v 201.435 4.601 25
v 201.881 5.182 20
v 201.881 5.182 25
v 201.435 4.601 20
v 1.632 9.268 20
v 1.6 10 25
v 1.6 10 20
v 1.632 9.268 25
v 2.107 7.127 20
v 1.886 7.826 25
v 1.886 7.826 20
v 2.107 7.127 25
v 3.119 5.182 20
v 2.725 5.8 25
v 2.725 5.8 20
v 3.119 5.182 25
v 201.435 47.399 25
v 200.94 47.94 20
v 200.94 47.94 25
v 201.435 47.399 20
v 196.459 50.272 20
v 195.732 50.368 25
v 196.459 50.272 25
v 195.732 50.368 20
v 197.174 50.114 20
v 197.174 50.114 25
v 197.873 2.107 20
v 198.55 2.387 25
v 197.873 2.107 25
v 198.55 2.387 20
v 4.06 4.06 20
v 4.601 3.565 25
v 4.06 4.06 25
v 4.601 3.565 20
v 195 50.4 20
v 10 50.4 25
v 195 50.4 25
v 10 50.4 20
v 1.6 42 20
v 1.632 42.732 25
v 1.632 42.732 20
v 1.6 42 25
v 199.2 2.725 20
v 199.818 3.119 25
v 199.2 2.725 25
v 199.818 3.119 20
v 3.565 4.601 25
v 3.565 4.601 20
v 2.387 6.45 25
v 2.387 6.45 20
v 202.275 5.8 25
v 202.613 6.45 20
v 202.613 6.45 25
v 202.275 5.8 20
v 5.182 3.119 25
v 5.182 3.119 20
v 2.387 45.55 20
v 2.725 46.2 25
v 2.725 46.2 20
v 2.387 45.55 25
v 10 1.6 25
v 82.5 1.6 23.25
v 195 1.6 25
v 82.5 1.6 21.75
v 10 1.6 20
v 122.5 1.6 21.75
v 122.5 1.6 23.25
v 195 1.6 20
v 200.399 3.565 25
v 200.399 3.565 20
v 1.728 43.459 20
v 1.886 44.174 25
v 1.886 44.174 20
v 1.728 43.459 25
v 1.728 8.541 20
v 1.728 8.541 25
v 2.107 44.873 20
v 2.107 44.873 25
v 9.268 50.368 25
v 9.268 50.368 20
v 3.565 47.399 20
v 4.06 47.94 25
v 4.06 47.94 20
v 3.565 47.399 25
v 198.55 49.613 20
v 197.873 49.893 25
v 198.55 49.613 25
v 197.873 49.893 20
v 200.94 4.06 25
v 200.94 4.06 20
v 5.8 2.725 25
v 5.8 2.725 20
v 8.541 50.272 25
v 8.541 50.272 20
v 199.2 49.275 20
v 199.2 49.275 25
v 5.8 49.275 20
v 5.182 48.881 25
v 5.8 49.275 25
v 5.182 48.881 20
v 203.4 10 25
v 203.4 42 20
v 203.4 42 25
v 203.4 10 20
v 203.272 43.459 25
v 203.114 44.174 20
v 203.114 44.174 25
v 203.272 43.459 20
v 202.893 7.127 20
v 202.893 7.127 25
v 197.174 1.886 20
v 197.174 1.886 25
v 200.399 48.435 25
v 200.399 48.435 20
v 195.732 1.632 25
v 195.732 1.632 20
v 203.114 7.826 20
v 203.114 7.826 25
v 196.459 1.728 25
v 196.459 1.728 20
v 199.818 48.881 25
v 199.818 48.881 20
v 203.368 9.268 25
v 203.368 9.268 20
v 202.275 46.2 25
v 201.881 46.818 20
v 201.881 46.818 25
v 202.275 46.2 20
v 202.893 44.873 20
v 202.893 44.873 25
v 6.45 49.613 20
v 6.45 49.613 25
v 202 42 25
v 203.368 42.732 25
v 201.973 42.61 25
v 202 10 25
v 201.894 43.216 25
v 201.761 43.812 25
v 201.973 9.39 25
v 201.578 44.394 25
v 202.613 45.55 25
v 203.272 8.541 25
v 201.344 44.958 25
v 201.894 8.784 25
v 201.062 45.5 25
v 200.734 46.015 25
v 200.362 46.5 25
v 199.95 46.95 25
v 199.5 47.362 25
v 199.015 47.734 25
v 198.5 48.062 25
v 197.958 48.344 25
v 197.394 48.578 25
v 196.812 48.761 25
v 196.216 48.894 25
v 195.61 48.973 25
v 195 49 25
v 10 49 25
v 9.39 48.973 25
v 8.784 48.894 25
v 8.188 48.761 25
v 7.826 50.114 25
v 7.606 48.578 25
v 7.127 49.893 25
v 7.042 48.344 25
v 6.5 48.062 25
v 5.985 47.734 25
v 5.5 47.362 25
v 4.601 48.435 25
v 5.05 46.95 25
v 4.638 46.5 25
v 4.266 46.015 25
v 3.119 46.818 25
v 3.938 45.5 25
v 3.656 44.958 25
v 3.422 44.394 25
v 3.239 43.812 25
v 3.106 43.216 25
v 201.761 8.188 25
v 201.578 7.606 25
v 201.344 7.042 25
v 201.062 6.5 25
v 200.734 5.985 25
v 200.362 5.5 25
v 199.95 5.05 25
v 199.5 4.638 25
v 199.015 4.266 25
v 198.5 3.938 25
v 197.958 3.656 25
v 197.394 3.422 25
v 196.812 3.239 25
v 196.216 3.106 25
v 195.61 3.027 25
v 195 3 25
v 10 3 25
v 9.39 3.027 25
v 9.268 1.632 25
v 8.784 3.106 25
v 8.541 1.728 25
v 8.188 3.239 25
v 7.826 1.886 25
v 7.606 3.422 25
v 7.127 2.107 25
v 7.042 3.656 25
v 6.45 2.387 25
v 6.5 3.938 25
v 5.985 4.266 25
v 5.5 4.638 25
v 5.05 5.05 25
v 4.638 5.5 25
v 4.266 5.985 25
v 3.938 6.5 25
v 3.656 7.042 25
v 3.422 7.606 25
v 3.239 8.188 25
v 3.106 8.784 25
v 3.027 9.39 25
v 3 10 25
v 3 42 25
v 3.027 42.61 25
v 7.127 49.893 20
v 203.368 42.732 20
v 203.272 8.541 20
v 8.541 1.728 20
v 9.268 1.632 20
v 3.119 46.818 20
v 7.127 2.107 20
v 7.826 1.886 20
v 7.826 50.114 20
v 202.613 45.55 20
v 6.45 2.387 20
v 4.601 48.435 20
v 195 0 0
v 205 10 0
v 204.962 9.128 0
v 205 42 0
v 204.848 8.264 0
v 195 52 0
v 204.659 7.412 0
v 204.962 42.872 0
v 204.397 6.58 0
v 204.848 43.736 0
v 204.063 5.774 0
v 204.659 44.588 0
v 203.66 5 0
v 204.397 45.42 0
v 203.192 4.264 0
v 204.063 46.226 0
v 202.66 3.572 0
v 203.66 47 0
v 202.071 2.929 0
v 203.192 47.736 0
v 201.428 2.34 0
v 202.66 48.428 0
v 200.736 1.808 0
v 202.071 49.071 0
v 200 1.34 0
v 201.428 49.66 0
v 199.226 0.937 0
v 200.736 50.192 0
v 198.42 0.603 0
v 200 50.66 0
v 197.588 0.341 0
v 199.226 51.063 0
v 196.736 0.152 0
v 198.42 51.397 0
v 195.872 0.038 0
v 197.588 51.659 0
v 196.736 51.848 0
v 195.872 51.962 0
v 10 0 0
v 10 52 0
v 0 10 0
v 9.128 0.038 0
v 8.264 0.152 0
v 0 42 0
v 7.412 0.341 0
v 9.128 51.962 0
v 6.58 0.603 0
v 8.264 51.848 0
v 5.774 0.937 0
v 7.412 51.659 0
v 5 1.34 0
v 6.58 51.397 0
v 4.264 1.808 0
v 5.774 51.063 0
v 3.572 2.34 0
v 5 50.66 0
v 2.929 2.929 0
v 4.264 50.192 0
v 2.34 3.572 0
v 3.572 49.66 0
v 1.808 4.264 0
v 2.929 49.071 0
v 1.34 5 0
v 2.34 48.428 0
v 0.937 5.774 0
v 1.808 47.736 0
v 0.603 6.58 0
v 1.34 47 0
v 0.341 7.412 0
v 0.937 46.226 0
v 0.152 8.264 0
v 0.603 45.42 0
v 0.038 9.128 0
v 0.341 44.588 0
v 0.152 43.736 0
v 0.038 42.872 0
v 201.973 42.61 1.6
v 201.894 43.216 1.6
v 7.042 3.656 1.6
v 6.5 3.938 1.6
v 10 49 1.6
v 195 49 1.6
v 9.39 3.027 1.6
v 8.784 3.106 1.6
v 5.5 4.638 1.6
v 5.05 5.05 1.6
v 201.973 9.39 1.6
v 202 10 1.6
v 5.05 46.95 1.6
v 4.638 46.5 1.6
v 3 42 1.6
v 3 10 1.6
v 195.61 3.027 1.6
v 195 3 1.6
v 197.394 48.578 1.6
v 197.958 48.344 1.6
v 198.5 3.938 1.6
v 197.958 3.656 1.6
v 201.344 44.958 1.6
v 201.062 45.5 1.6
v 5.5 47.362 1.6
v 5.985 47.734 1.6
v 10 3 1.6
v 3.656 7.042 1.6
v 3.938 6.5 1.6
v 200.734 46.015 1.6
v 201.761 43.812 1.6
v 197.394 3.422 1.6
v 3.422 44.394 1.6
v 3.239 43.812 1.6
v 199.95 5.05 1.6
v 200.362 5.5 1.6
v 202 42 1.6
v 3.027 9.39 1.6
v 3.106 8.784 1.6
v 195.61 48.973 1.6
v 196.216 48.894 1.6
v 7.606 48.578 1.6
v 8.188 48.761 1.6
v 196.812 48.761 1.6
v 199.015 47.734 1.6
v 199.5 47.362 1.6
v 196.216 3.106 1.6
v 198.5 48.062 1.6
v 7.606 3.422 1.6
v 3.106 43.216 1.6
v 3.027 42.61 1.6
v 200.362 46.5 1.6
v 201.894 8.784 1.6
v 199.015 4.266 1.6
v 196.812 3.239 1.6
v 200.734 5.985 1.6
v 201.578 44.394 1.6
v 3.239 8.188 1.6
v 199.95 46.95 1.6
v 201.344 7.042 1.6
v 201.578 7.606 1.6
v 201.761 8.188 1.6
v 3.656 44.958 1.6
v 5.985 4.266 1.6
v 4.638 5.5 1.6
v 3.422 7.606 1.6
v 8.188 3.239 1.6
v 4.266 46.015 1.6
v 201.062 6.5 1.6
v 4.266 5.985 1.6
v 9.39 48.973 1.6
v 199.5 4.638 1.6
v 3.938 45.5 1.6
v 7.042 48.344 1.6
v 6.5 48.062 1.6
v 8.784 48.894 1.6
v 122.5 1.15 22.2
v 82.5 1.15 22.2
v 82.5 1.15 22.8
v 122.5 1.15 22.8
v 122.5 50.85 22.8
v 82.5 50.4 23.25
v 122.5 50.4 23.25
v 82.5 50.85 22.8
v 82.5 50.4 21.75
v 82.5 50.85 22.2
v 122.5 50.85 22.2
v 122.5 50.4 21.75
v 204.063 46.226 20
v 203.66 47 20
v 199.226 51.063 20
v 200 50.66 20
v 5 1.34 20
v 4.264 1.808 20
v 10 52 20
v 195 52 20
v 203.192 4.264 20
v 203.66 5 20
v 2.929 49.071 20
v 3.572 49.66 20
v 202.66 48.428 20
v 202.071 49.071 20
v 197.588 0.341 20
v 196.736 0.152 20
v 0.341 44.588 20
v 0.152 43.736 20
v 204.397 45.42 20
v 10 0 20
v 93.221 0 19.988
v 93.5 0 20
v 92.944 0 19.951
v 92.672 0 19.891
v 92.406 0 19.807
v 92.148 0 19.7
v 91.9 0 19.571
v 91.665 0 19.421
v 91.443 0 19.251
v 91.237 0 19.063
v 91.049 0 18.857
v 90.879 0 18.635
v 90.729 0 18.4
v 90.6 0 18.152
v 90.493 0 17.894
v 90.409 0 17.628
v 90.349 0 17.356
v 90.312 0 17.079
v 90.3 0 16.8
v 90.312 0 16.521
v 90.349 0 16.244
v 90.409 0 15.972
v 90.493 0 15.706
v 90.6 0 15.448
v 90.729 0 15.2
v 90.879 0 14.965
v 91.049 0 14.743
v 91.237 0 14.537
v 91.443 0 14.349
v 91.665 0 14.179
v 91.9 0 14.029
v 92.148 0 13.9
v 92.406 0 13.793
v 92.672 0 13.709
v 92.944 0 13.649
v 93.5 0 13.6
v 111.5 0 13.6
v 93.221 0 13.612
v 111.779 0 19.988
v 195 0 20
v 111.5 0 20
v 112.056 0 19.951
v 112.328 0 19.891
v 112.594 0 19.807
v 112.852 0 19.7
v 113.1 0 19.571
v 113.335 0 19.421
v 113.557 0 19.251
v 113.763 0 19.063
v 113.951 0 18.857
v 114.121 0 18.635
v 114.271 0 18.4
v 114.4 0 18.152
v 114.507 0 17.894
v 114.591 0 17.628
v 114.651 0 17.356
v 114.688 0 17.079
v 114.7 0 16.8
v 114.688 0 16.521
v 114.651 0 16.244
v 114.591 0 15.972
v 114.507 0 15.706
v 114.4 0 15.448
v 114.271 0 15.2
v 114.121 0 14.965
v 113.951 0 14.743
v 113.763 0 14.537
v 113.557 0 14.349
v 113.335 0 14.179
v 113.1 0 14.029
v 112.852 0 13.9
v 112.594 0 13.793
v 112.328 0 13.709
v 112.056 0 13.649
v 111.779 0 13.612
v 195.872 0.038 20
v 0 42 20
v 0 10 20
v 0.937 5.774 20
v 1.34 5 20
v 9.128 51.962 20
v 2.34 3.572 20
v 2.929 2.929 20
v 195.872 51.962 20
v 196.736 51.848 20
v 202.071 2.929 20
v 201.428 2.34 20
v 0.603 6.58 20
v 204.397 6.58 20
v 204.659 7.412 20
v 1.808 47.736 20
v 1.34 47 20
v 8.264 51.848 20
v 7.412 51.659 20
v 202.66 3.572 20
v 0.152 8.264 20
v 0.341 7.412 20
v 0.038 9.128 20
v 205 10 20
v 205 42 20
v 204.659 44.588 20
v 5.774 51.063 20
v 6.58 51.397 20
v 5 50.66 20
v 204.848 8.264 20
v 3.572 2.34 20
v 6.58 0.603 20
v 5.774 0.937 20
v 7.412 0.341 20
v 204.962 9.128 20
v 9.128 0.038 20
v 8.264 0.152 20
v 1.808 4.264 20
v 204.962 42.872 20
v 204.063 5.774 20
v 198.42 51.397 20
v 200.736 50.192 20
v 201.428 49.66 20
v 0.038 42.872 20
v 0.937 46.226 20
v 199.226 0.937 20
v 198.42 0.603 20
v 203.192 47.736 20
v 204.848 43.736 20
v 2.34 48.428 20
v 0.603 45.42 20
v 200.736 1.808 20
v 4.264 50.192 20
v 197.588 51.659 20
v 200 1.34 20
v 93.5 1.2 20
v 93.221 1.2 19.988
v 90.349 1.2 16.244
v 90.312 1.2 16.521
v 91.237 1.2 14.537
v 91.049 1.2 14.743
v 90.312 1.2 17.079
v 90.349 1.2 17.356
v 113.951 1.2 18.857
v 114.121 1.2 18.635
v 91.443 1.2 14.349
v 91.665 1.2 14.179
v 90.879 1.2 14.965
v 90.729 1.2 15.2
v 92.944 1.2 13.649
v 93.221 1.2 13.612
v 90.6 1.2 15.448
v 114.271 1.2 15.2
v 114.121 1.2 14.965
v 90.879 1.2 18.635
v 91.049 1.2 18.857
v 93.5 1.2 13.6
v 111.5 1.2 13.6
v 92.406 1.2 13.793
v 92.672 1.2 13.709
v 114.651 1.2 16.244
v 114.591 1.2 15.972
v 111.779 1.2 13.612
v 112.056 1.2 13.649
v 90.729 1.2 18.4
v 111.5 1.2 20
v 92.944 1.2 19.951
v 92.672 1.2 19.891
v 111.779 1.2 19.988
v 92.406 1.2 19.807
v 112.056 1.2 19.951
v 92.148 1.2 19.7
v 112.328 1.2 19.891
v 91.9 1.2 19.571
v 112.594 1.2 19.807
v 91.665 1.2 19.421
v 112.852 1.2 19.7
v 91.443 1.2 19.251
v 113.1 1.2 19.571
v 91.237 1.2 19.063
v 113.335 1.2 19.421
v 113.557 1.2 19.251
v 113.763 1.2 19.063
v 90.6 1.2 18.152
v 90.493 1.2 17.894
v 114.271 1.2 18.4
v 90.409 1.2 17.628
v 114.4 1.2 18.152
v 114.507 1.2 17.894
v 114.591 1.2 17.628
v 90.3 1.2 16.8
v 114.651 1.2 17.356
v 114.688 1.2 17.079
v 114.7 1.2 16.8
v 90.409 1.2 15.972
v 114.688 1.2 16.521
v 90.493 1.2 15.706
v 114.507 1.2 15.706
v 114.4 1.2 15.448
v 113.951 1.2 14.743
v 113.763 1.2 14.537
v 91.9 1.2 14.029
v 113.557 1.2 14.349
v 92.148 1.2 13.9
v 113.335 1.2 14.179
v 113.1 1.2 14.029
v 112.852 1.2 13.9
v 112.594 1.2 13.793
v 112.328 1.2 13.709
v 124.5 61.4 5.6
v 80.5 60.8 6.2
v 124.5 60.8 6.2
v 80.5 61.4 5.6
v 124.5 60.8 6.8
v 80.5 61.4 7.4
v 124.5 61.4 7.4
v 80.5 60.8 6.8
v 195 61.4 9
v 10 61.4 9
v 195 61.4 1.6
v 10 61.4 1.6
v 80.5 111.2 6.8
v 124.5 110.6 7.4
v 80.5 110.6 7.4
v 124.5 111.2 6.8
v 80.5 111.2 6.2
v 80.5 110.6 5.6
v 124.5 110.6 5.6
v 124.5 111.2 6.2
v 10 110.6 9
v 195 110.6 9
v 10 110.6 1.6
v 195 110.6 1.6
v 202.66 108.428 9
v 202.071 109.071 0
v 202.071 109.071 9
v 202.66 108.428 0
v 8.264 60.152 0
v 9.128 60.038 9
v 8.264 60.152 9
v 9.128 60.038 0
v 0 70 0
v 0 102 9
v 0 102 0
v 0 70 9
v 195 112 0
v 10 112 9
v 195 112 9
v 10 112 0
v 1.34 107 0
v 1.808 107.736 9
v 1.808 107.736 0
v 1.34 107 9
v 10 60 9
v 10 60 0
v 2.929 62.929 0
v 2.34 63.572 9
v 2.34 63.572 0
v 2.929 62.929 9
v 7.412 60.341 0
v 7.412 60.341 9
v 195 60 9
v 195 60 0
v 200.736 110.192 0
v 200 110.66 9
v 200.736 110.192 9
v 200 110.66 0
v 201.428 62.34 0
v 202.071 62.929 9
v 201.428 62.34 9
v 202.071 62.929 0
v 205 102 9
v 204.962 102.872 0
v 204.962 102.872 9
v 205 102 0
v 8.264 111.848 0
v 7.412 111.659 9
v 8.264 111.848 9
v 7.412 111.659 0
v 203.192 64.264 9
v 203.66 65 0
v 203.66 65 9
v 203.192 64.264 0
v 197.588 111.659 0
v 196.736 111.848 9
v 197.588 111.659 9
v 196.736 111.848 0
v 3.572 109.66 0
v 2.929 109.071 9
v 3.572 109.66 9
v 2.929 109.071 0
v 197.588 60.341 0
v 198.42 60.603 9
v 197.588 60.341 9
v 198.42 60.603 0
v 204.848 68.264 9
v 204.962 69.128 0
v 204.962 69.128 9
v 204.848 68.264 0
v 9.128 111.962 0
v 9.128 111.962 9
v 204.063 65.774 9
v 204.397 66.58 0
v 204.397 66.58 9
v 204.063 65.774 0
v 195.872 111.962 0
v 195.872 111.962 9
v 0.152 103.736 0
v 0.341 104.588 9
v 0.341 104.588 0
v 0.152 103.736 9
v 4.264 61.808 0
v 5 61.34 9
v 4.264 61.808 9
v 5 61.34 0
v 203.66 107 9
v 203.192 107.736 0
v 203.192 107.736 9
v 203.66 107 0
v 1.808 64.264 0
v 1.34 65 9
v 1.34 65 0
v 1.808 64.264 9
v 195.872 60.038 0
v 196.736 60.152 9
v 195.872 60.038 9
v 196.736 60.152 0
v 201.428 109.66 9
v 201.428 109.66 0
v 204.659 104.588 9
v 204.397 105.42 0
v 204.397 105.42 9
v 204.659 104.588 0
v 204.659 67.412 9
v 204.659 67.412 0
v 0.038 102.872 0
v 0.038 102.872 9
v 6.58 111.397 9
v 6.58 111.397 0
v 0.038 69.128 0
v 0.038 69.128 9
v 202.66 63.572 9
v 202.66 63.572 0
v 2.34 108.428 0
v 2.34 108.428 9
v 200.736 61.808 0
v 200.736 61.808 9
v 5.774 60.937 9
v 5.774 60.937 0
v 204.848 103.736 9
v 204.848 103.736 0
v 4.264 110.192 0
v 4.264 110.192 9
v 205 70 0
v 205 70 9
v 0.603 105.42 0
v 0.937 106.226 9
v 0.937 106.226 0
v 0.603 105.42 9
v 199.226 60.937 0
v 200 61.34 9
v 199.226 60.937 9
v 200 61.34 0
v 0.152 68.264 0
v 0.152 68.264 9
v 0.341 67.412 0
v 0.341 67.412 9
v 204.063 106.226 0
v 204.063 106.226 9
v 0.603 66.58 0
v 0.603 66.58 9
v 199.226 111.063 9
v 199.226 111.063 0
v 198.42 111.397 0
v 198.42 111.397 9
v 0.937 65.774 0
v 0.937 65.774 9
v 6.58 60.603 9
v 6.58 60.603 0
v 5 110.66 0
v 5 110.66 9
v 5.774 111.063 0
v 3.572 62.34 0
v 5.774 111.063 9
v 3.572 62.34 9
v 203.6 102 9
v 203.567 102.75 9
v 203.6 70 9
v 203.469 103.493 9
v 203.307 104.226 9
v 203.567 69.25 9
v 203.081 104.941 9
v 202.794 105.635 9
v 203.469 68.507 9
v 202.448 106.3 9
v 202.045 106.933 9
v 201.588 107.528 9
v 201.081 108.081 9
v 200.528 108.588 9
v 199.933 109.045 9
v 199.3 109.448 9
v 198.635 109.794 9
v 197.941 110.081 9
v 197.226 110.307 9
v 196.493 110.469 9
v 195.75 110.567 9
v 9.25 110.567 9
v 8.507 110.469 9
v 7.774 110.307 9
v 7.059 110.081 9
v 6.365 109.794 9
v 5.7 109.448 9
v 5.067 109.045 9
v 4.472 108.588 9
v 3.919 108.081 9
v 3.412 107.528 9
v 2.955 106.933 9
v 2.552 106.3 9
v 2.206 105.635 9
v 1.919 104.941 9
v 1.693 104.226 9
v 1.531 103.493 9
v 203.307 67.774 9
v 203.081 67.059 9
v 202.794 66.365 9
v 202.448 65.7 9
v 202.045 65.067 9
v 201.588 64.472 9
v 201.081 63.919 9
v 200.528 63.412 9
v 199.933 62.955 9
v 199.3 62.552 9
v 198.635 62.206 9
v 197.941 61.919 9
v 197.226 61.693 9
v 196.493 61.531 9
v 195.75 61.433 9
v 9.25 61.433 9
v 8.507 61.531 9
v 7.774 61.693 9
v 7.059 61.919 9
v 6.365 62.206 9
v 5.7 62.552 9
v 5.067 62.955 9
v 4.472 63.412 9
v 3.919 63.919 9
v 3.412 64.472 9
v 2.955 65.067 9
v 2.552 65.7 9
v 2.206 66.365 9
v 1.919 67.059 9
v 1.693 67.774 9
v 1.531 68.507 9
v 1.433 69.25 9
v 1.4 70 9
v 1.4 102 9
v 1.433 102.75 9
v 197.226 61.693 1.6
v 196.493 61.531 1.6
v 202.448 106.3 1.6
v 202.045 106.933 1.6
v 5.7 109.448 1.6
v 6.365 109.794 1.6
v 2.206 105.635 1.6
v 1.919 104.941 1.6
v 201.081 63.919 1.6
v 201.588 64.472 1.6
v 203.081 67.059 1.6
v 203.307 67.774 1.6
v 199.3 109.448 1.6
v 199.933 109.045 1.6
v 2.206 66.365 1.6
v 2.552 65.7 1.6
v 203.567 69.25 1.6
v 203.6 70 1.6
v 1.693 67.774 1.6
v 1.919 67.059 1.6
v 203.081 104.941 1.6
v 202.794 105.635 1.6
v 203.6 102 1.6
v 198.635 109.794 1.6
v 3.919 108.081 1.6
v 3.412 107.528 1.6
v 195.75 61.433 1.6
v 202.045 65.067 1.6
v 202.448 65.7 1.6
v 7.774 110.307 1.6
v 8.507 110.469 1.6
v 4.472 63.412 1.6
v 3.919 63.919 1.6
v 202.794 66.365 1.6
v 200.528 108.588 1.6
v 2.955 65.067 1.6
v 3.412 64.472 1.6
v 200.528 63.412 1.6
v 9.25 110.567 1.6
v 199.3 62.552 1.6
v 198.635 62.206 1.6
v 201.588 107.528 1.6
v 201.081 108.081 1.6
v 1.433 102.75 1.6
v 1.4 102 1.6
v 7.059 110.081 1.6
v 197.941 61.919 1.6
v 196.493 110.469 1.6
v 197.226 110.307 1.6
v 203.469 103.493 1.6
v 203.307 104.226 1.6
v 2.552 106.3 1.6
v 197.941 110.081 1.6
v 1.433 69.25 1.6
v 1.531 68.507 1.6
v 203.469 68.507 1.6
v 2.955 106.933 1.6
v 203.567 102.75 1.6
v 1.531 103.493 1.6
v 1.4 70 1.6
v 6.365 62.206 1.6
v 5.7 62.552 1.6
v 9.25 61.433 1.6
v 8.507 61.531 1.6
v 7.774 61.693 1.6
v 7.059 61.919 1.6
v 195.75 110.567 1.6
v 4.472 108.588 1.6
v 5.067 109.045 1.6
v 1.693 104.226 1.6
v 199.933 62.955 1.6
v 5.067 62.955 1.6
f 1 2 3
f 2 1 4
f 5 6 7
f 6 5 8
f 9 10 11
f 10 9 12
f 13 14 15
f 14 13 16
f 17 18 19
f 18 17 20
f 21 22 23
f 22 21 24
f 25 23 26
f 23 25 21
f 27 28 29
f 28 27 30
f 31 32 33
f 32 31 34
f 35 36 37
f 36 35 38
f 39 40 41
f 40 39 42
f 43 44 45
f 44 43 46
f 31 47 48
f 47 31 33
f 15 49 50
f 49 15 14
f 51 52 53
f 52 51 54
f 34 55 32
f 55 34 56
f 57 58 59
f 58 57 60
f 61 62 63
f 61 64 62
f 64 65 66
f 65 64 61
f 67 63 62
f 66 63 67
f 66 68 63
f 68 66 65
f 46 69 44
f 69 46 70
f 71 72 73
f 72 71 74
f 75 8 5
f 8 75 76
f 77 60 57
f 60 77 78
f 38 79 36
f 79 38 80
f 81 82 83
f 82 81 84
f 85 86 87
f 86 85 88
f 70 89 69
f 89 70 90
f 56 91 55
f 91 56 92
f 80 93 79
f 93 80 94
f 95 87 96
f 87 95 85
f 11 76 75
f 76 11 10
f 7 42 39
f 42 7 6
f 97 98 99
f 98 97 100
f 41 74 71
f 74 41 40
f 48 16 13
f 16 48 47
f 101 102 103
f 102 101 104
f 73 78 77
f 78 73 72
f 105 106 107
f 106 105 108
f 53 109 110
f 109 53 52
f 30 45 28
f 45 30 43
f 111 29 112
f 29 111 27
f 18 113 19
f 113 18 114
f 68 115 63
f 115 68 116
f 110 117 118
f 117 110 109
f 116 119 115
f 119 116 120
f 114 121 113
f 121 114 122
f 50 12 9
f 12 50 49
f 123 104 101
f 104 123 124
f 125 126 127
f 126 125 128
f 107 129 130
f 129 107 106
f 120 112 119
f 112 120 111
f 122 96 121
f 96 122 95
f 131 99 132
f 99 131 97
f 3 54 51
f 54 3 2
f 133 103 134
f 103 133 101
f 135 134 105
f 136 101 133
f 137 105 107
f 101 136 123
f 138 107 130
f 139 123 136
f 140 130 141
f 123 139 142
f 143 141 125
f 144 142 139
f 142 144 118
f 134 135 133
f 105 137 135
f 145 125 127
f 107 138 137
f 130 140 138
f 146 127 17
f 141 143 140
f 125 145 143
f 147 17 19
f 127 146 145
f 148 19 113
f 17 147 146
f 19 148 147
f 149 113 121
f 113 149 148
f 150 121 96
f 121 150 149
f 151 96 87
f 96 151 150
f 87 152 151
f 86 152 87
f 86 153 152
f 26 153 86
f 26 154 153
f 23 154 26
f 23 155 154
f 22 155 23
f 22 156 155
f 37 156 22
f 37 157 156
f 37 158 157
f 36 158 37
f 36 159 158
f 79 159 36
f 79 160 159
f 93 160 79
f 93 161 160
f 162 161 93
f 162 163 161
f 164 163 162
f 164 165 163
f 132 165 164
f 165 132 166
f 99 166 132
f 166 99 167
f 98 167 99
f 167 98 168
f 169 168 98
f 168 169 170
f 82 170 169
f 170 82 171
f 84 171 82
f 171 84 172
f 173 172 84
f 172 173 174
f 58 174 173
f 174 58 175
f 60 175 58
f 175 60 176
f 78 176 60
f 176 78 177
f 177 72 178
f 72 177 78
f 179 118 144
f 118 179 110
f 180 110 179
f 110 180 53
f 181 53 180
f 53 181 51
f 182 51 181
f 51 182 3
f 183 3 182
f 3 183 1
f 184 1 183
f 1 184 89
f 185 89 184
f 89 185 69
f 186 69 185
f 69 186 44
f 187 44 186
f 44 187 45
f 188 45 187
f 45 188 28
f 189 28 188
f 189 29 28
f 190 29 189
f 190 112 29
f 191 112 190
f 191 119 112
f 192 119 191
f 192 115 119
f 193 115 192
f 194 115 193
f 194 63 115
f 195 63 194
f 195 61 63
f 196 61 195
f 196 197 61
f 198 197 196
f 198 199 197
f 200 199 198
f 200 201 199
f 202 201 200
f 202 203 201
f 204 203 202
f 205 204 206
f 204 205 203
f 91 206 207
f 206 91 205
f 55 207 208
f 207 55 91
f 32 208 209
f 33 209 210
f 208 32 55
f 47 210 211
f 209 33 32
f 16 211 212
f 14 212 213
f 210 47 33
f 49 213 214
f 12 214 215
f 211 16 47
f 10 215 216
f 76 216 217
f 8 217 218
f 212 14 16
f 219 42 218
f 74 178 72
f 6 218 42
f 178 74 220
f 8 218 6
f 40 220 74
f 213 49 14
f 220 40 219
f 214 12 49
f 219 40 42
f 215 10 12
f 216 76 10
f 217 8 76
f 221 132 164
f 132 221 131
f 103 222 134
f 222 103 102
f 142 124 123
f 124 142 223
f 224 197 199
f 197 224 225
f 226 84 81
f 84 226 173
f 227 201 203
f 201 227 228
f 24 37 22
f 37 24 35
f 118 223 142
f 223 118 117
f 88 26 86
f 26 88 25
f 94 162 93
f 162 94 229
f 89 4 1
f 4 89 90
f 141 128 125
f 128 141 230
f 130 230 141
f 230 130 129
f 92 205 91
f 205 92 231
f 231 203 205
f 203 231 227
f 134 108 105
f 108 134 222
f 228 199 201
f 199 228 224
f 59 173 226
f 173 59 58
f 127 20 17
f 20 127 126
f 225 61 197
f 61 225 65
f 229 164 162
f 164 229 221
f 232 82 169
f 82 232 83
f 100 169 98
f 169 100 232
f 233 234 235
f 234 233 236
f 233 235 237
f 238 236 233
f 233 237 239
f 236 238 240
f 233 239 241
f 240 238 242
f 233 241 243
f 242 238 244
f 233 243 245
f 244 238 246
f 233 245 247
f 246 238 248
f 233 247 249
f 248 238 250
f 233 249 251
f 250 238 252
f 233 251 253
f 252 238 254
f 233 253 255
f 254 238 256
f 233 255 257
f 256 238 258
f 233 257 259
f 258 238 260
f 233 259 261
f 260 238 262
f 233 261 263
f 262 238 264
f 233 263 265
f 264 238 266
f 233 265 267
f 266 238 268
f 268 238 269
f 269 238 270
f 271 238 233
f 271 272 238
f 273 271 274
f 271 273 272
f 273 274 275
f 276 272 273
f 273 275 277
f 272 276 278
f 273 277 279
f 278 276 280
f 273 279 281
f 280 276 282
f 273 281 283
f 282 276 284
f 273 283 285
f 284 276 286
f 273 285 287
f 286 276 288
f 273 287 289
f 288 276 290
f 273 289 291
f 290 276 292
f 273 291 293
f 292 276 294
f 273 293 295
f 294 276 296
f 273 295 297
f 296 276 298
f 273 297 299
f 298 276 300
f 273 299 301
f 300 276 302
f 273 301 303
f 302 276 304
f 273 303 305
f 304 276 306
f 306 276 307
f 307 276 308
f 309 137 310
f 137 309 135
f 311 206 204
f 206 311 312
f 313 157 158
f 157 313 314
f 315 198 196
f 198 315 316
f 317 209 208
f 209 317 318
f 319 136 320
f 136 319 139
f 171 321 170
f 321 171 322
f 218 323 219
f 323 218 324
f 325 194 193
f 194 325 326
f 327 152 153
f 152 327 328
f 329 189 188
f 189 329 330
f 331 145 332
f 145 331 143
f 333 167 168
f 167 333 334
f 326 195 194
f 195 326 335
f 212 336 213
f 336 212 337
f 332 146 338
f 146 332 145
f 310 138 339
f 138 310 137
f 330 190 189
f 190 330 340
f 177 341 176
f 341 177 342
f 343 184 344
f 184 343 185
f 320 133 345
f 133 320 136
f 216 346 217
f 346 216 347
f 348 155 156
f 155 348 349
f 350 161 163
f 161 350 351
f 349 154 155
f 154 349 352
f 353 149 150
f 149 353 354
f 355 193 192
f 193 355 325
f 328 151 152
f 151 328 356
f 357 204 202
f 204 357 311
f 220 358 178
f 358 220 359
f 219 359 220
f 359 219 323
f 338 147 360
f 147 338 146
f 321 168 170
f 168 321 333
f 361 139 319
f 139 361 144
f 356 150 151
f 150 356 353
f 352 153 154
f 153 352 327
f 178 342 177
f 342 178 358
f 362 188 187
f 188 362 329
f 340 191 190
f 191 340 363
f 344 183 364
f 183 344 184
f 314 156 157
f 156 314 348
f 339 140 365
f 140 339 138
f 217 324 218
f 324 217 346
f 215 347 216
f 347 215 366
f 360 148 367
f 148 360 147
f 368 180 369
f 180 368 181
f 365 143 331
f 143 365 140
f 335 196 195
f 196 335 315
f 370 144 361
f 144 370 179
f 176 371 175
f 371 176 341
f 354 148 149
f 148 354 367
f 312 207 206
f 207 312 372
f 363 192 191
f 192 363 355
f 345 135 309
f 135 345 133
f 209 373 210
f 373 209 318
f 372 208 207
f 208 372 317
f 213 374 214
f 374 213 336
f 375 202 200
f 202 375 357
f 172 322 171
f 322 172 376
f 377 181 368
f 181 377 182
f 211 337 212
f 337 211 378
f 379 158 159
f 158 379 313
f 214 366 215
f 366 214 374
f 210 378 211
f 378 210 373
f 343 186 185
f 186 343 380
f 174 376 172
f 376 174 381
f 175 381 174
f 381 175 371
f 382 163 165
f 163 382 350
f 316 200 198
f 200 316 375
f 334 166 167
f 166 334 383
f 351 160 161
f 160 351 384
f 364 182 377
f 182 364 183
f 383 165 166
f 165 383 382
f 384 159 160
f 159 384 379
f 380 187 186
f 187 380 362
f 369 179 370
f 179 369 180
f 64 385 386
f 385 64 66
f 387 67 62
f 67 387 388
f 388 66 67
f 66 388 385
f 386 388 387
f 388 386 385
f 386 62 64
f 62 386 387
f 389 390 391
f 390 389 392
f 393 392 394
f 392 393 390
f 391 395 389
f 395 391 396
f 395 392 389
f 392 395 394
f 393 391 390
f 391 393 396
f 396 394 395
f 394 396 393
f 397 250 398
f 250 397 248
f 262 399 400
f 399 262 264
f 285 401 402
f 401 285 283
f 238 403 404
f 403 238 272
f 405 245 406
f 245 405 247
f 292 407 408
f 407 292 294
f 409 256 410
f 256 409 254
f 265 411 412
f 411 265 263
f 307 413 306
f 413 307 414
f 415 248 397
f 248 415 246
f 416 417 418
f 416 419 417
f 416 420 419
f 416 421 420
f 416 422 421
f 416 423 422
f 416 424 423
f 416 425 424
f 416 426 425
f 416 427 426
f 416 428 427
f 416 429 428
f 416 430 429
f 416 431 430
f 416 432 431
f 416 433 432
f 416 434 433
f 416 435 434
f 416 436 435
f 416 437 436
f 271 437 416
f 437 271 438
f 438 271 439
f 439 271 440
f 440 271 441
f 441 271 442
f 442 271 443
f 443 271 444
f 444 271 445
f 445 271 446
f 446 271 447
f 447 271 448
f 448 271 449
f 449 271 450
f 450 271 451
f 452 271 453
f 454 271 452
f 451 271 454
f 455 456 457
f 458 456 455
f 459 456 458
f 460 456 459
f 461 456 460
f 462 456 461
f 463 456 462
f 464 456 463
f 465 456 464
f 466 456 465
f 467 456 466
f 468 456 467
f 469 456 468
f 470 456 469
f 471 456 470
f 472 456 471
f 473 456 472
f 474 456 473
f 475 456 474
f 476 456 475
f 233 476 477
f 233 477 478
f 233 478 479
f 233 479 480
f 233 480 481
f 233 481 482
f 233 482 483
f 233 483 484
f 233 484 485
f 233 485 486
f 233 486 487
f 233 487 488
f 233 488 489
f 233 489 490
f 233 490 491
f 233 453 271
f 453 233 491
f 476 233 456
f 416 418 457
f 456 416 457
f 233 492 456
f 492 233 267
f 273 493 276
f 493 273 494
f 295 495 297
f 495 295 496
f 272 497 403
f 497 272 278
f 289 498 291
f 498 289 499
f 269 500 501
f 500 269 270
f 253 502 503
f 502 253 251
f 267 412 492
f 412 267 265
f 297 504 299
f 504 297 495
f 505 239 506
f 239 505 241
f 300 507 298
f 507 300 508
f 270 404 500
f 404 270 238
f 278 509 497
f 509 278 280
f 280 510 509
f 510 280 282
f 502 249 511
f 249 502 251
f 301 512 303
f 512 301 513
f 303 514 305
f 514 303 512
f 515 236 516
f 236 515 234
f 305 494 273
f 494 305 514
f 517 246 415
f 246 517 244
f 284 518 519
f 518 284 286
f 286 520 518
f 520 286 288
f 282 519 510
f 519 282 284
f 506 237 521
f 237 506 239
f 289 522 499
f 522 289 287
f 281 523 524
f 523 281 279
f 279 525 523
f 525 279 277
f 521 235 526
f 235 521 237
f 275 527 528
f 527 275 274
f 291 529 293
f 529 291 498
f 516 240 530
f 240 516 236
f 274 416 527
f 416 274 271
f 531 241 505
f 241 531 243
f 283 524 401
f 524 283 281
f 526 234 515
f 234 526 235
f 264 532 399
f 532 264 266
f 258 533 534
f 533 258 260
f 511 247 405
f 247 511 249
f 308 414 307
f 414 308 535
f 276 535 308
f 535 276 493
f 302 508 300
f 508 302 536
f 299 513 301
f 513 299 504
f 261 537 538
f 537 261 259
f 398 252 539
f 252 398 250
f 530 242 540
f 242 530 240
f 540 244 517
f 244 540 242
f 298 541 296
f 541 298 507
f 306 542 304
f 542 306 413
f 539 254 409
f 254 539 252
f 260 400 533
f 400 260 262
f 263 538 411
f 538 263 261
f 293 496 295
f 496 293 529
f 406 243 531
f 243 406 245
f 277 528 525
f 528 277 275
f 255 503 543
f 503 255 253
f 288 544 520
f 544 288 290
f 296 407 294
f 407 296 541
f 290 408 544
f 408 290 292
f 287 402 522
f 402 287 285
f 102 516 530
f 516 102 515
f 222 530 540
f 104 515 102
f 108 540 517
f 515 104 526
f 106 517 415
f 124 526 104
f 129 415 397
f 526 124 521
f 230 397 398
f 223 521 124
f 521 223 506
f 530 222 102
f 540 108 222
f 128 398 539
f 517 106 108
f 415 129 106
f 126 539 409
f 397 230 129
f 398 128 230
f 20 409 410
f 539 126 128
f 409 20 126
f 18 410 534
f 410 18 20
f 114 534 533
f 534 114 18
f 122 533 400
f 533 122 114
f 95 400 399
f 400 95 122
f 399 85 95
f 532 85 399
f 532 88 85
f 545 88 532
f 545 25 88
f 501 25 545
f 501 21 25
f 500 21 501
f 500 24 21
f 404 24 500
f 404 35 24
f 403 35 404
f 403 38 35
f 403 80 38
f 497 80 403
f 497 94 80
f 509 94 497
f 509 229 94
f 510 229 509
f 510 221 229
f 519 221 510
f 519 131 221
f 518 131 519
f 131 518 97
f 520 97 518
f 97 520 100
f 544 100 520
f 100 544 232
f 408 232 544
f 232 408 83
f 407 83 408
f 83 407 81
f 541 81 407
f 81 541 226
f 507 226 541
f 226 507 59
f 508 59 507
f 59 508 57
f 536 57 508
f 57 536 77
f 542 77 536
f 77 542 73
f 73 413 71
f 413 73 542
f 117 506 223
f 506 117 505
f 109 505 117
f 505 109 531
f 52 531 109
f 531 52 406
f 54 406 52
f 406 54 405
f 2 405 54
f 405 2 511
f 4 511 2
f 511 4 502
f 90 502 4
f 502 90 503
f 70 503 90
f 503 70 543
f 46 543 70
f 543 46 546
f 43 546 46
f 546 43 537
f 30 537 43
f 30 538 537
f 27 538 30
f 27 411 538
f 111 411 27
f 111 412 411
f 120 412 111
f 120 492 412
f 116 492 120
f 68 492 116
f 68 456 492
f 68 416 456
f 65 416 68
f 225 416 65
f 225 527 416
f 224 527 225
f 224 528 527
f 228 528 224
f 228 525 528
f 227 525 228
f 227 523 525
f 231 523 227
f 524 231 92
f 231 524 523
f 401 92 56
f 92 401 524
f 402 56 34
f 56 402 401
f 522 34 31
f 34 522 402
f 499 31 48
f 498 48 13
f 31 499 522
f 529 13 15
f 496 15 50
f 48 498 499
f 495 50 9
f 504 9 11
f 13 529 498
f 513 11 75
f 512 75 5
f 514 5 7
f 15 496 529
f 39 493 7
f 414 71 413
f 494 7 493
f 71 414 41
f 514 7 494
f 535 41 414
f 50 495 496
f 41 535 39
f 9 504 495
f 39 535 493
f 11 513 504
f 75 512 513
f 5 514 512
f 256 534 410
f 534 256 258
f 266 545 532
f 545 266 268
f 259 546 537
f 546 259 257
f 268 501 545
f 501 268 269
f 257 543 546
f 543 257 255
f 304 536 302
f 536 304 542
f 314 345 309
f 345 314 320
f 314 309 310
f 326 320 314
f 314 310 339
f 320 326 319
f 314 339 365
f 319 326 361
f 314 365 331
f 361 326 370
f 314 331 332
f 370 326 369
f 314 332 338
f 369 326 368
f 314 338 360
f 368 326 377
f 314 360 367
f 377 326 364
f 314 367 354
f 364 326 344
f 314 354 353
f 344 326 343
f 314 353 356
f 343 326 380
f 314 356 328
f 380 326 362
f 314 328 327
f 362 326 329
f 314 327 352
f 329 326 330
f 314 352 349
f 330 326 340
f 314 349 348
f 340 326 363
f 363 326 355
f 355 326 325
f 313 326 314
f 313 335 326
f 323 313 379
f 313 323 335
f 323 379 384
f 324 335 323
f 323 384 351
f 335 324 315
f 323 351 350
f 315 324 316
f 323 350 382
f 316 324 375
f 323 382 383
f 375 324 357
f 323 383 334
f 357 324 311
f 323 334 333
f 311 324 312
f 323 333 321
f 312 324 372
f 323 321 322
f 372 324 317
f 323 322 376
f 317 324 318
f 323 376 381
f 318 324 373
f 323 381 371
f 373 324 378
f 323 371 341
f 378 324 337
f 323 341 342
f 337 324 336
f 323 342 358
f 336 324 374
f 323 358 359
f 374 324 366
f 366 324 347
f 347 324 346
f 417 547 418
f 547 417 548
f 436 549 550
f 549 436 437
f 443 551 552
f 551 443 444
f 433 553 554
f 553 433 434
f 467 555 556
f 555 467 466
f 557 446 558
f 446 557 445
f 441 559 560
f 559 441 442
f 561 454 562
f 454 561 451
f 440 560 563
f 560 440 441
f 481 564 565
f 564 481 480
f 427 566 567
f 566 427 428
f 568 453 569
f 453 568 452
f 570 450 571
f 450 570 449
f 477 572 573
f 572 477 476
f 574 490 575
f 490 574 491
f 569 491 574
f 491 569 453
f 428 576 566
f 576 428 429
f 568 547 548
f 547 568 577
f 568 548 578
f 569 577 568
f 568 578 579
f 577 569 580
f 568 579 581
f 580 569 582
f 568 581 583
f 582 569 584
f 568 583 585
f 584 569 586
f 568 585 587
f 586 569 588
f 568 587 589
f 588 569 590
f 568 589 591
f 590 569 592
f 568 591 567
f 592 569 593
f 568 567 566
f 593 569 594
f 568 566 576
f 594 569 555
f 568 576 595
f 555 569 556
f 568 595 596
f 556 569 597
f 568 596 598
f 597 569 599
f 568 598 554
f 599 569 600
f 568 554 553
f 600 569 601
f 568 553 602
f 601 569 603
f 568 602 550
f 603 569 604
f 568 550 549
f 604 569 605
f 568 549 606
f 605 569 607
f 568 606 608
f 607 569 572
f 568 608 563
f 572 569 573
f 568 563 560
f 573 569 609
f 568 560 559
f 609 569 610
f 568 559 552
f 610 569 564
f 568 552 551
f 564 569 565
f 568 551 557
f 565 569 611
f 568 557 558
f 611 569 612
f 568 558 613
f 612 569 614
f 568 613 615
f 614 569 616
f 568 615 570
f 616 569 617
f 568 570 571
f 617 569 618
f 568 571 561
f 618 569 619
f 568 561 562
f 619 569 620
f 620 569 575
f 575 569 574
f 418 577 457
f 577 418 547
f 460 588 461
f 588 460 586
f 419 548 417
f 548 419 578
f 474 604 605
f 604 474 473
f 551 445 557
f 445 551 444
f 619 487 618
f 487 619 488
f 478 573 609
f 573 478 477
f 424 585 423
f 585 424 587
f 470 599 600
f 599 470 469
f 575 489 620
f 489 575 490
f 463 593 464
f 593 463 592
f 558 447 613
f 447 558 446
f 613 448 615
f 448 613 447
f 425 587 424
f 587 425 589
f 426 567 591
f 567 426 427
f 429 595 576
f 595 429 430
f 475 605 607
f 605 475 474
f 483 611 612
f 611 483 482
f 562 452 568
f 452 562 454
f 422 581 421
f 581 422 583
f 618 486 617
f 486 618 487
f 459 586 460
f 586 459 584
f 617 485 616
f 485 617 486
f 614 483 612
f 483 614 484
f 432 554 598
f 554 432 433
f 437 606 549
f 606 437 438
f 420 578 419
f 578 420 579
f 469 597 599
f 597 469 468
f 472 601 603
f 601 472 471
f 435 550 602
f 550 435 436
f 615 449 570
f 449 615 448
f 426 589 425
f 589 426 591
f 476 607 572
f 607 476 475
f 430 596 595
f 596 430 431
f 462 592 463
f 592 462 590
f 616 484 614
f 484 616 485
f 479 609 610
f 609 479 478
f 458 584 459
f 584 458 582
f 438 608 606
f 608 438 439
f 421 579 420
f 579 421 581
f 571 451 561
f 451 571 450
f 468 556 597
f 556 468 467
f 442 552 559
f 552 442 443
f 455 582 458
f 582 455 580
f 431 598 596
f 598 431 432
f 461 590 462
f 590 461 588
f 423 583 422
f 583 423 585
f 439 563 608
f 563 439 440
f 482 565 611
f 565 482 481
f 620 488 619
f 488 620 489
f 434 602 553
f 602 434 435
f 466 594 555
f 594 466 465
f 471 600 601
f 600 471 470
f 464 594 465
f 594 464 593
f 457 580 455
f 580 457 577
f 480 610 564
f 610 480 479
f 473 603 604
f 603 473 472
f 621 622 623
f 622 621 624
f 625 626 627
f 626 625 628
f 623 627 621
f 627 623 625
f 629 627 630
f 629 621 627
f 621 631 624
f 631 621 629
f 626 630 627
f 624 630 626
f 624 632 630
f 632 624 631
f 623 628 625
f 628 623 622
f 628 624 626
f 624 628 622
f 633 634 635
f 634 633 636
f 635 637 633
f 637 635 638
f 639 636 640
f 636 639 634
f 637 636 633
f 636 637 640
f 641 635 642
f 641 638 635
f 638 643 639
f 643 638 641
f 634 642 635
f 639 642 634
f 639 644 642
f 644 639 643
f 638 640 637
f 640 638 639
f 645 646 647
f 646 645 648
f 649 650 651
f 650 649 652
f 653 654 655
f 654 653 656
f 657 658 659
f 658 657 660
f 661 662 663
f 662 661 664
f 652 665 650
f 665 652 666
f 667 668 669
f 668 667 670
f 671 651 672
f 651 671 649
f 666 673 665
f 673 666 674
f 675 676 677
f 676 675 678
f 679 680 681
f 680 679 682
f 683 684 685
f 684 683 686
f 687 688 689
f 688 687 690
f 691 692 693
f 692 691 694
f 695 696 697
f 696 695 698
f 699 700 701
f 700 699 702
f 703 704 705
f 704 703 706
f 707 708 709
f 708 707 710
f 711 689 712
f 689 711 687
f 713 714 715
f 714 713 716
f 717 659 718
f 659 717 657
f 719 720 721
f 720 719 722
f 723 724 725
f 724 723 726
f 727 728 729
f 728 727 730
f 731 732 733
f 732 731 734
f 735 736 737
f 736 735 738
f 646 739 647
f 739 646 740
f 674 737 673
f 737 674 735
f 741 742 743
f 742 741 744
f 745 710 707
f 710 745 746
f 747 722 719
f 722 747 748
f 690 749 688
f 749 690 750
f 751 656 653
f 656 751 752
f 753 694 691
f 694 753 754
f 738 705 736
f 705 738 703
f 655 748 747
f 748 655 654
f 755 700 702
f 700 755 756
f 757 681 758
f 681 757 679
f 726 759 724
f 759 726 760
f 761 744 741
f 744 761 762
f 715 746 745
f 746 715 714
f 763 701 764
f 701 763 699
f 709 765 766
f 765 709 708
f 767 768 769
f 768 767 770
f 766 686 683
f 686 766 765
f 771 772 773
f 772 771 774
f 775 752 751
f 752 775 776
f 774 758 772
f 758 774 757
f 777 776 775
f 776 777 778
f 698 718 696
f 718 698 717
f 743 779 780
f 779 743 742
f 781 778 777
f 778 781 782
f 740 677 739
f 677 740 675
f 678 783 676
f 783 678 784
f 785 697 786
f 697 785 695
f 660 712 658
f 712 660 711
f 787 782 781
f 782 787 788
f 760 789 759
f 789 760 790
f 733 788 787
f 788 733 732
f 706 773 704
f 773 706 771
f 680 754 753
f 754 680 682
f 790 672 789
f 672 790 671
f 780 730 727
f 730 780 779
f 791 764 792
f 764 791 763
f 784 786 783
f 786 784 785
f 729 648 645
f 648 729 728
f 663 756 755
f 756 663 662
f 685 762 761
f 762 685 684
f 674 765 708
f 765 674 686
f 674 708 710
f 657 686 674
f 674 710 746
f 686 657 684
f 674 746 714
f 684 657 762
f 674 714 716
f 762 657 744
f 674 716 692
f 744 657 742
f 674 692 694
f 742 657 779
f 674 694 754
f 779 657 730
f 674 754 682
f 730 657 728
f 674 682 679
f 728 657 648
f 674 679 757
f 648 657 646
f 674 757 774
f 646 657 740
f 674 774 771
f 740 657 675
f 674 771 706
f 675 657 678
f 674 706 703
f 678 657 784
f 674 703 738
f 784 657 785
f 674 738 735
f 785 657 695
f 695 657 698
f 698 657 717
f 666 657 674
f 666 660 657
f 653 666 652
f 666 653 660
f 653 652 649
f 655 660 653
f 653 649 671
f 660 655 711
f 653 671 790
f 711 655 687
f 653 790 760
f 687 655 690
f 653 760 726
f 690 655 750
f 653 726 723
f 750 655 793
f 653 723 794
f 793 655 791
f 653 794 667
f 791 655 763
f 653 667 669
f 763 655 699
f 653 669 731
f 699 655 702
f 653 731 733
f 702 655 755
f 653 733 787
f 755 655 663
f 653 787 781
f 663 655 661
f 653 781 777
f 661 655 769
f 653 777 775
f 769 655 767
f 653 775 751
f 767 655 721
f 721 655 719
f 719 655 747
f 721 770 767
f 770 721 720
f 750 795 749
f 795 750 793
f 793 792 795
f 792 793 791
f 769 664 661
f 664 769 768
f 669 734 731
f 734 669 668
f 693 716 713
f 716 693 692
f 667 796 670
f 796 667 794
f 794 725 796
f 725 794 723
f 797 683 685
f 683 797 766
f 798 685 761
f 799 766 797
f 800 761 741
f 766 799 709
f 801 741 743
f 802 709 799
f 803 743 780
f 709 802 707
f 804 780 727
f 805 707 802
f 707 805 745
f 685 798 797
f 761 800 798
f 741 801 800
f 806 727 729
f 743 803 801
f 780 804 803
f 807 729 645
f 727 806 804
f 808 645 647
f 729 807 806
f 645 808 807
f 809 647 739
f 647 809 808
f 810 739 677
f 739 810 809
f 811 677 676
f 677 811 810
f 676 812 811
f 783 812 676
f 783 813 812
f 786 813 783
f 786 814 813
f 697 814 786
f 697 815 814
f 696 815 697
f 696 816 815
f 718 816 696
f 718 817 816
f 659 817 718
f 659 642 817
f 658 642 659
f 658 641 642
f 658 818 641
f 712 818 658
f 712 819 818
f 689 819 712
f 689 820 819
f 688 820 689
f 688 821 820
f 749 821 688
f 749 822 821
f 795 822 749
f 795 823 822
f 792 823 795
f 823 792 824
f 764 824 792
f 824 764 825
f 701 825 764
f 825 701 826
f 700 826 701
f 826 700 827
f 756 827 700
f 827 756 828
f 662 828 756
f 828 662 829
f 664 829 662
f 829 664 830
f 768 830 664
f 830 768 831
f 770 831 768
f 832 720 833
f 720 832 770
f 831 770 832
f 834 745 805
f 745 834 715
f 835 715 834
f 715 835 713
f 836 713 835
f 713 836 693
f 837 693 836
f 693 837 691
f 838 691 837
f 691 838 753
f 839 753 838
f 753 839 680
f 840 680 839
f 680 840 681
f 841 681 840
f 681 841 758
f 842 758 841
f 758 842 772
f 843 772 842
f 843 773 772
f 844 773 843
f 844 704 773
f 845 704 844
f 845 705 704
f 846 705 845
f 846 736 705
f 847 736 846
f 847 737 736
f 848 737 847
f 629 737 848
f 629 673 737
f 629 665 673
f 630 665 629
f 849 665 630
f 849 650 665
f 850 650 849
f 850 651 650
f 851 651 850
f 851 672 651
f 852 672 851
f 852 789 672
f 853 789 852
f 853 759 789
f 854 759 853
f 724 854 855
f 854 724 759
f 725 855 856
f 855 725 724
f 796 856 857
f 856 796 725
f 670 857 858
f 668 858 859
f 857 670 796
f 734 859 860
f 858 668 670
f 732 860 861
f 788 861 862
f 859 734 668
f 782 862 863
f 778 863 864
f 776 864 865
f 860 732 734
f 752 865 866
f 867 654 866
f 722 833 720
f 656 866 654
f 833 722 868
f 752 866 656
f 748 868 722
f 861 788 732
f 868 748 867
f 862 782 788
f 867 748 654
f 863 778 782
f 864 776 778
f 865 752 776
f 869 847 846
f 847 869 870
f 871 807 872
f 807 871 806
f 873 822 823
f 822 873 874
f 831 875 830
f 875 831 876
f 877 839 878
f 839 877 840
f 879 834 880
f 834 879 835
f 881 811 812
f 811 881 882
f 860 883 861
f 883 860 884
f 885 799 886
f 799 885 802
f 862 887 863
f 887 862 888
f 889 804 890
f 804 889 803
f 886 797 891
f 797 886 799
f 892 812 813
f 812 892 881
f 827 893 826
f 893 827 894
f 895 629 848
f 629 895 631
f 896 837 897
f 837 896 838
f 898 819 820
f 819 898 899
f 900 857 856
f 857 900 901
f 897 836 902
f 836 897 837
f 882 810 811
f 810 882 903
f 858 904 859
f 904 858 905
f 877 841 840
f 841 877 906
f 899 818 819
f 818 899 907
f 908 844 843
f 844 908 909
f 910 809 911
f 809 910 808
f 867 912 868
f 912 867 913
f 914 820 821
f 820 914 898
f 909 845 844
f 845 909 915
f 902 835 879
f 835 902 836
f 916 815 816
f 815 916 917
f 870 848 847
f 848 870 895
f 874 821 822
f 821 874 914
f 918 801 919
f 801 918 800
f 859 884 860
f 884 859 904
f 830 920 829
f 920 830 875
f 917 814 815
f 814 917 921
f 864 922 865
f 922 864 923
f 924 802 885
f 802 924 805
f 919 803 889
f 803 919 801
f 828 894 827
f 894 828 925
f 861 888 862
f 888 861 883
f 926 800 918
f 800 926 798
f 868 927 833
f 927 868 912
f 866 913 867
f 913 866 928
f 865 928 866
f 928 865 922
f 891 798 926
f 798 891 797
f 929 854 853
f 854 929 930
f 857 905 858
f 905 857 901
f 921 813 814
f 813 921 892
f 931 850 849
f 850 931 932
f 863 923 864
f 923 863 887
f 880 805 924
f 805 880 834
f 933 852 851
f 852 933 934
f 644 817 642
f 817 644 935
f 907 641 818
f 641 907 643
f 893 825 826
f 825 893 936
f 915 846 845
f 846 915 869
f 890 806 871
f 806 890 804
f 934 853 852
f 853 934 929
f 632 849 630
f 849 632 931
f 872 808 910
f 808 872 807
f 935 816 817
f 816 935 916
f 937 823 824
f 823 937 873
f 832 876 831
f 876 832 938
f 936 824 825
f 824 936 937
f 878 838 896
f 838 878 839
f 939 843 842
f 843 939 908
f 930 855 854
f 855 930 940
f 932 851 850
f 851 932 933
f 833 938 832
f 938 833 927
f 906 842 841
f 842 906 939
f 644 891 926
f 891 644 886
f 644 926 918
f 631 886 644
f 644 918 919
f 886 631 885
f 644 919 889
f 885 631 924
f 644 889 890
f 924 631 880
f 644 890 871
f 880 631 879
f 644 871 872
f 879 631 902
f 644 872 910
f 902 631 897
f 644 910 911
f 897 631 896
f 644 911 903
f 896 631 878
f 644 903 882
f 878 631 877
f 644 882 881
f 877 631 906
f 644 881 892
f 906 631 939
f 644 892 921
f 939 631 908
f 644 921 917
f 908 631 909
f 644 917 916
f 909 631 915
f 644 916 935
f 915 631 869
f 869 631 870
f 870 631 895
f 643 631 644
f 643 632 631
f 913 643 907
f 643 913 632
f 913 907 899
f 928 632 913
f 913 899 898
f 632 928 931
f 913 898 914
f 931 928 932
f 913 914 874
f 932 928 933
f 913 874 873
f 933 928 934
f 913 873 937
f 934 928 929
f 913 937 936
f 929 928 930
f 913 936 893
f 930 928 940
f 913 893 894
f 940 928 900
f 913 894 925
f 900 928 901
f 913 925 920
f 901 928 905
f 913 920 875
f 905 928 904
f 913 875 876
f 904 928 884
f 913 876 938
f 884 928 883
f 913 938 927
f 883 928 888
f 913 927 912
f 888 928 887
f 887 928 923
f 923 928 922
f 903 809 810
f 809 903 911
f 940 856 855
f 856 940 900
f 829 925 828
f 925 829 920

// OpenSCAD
// Crew Cutlery Case - slim travel box with snap-on lid
// Holds a full fork / knife / spoon set (or chopsticks) for a crew bag.
// Two parts: base + lid. Lid snaps over a lip on the base.
// Units: mm. Print in PETG. Change values below, F6, export STL.

/* [What to render] */
part = "plate";   // [plate, base, lid, assembled]

/* [Size] */
length   = 205;   // outer length (fits cutlery up to ~195 mm)
width    = 52;    // outer width
corner_r = 10;    // rounded ends
base_h   = 20;    // base height up to the shoulder
lid_h    = 9;     // lid height

/* [Walls & fit] */
base_wall = 3.0;
lid_wall  = 1.4;
floor_t   = 1.6;
top_t     = 1.6;
clearance = 0.2;  // gap between lip and lid (raise to 0.3 if too tight)
lip_h     = 5;

/* [Snap] */
snap_len   = 40;   // length of snap ridge on each long side
snap_bump  = 0.45; // how far the ridge sticks out (more = firmer click)
snap_z     = 2.5;  // ridge height above the shoulder

/* [Extras] */
thumb_notch = true;
lanes       = 0;   // 0 = open, 2 = two low rails giving 3 lanes

$fn = 72;

lip_out = lid_wall + clearance;           // lip outer inset from outside
lip_in  = base_wall;                      // lip inner inset (= cavity)

module rr(l, w, h, r, inset=0) {
    // rounded rectangle prism, inset on all sides
    ri = max(r - inset, 0.5);
    translate([inset, inset, 0])
    hull() for (x=[ri, l-2*inset-ri], y=[ri, w-2*inset-ri])
        translate([x, y, 0]) cylinder(r=ri, h=h);
}

// triangular ridge along X, sticking out in -Y (front) by d, height 2*d+0.6
module ridge(len, d) {
    h = 2*d + 0.6;
    rotate([90,0,90]) linear_extrude(len, center=true)
        polygon([[0,-h/2],[d,-0.3],[d,0.3],[0,h/2]]);
}

module base() {
    difference() {
        union() {
            rr(length, width, base_h, corner_r);
            // lip
            difference() {
                rr(length, width, base_h + lip_h, corner_r, lip_out);
                translate([0,0,-1]) rr(length, width, base_h + lip_h + 2, corner_r, lip_in);
            }
            // snap ridges on the lip, both long sides
            for (side=[0,1])
                translate([length/2, side ? width-lip_out : lip_out, base_h + snap_z])
                    mirror([0, 1-side, 0]) ridge(snap_len, snap_bump);
        }
        // cavity
        translate([0,0,floor_t]) rr(length, width, base_h + lip_h, corner_r, base_wall);
        // thumb notch just under the shoulder, front side
        if (thumb_notch)
            translate([length/2, -1, base_h - 3.2])
                hull() for (dx=[-9, 9]) translate([dx, 0, 0])
                    rotate([-90,0,0]) cylinder(r=3.2, h=1.2 + 1);
    }
    // optional lane rails
    if (lanes > 0)
        for (i=[1:lanes]) {
            y = base_wall + i*(width - 2*base_wall)/(lanes+1);
            translate([corner_r+6, y-0.6, 0]) cube([length-2*corner_r-12, 1.2, floor_t + 6]);
        }
}

module lid() {
    // modelled upside-down as it prints: top face on the bed (z=0)
    difference() {
        rr(length, width, lid_h, corner_r);
        translate([0,0,top_t]) rr(length, width, lid_h, corner_r, lid_wall);
        // snap grooves, matching the ridges (a bit longer + deeper)
        for (side=[0,1])
            translate([length/2, side ? width-lid_wall : lid_wall, lid_h - snap_z])
                mirror([0, side, 0]) mirror([0,1,0]) ridge(snap_len + 4, snap_bump + 0.15);
    }
}

if (part == "base") base();
else if (part == "lid") lid();
else if (part == "assembled") {
    color("#d9e2ec") base();
    color("#c8102e") translate([0, width, base_h + lid_h]) rotate([180,0,0]) lid();
}
else { // plate: both parts side by side, ready to print
    base();
    translate([0, width + 8, 0]) lid();
}
